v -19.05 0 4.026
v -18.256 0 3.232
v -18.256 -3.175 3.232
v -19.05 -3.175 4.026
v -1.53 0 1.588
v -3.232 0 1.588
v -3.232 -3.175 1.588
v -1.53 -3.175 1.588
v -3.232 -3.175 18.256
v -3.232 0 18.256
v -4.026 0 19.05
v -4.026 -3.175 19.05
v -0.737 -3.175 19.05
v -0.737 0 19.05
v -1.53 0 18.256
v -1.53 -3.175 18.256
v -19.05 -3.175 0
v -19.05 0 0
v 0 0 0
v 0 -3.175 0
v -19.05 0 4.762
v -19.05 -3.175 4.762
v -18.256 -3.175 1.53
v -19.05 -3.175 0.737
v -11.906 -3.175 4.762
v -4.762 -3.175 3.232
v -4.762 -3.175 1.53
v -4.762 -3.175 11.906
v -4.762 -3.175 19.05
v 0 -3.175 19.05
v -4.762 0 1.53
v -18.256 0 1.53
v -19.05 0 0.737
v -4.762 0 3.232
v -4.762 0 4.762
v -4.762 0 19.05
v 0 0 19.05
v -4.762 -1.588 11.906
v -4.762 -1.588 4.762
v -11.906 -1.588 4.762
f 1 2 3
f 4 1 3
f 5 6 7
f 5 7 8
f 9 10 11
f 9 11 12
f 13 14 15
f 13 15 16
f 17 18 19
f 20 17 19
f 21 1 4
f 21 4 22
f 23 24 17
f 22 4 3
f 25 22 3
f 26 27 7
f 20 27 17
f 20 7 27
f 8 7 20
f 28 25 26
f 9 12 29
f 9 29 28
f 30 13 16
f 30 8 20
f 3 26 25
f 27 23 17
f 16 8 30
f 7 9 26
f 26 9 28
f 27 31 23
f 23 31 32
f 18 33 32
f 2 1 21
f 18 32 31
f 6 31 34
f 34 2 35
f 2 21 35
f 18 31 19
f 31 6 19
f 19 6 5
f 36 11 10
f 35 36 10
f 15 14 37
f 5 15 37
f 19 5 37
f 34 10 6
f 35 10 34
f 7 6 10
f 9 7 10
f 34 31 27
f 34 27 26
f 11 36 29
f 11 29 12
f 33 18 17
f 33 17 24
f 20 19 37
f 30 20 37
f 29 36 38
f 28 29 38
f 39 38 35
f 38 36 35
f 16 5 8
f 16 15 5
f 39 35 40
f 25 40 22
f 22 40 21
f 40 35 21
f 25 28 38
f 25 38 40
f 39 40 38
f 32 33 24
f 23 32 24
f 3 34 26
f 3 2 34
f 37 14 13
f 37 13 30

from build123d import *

# Parameters (mm, degrees)
F0_W     = 1.53035
F0_H     = 11.1125
F0_H_2   = 3.175
F0_W_2   = 1.7018
F0_H_3   = 1.53035
F0_W_3   = 11.1125
F0_W_4   = 3.175
F0_H_4   = 1.7018
F1_DEPTH = 3.175
F3_DEPTH = 1.5875
F4_SIZE  = 0.79375
F5_DEPTH = 6.35
F6_DEPTH = 3.175


with BuildPart() as f1:
    # F0 (on Front) → F1 (new body)
    with BuildSketch(Plane.XZ):
        with Locations((-0.765175, 13.49375)):
            Rectangle(F0_W, F0_H)
        with Locations((-3.997325, 13.49375)):
            Rectangle(F0_W, F0_H)
        with Locations((-0.765175, 6.35)):
            Rectangle(F0_W, F0_H_2)
        with Locations((-2.38125, 6.35)):
            Rectangle(F0_W_2, F0_H_2)
        with Locations((-3.997325, 6.35)):
            Rectangle(F0_W, F0_H_2)
        Polygon((-4.7625, 0), (0, 0), (0, 4.7625), (-1.53035, 4.7625), (-1.53035, 1.53035), (-4.7625, 1.53035), align=None)
        Polygon((-4.7625, 3.23215), (-4.7625, 1.53035), (-1.53035, 1.53035), (-1.53035, 4.7625), (-3.23215, 4.7625), (-3.23215, 3.23215), align=None)
        with Locations((-3.997325, 3.997325)):
            Rectangle(F0_W, F0_H_3)
        with Locations((-13.49375, 3.997325)):
            Rectangle(F0_W_3, F0_H_3)
        with Locations((-13.49375, 0.765175)):
            Rectangle(F0_W_3, F0_H_3)
        with Locations((-6.35, 0.765175)):
            Rectangle(F0_W_4, F0_H_3)
        with Locations((-6.35, 2.38125)):
            Rectangle(F0_W_4, F0_H_4)
        with Locations((-6.35, 3.997325)):
            Rectangle(F0_W_4, F0_H_3)
    extrude(amount=F1_DEPTH)

    # F2 (on face) → F3 (join)
    with BuildSketch(Plane.XZ.offset(3.175)):
        Polygon((-4.7625, 11.90625), (-11.90625, 4.7625), (-4.7625, 4.7625), align=None)
    extrude(amount=-F3_DEPTH)

    # F4
    f4_edges = [f1.edges().sort_by_distance(p)[0] for p in [
        (-19.05, -1.5875, 3.23215),
        (-19.05, -1.5875, 1.53035),
        (-1.53035, -1.5875, 19.05),
        (-3.23215, -1.5875, 19.05),
    ]]
    chamfer(f4_edges, length=F4_SIZE)

    # F5 (cut): a face of the model
    f5_faces = [f1.faces().sort_by_distance(p)[0] for p in [
        (-2.38125, -1.5875, 7.9375),
    ]]
    extrude(f5_faces, amount=-F5_DEPTH, mode=Mode.SUBTRACT)

    # F6 (cut): a face of the model
    f6_faces = [f1.faces().sort_by_distance(p)[0] for p in [
        (-7.9375, -1.5875, 2.38125),
    ]]
    extrude(f6_faces, amount=-F6_DEPTH, mode=Mode.SUBTRACT)


solid = f1.part
